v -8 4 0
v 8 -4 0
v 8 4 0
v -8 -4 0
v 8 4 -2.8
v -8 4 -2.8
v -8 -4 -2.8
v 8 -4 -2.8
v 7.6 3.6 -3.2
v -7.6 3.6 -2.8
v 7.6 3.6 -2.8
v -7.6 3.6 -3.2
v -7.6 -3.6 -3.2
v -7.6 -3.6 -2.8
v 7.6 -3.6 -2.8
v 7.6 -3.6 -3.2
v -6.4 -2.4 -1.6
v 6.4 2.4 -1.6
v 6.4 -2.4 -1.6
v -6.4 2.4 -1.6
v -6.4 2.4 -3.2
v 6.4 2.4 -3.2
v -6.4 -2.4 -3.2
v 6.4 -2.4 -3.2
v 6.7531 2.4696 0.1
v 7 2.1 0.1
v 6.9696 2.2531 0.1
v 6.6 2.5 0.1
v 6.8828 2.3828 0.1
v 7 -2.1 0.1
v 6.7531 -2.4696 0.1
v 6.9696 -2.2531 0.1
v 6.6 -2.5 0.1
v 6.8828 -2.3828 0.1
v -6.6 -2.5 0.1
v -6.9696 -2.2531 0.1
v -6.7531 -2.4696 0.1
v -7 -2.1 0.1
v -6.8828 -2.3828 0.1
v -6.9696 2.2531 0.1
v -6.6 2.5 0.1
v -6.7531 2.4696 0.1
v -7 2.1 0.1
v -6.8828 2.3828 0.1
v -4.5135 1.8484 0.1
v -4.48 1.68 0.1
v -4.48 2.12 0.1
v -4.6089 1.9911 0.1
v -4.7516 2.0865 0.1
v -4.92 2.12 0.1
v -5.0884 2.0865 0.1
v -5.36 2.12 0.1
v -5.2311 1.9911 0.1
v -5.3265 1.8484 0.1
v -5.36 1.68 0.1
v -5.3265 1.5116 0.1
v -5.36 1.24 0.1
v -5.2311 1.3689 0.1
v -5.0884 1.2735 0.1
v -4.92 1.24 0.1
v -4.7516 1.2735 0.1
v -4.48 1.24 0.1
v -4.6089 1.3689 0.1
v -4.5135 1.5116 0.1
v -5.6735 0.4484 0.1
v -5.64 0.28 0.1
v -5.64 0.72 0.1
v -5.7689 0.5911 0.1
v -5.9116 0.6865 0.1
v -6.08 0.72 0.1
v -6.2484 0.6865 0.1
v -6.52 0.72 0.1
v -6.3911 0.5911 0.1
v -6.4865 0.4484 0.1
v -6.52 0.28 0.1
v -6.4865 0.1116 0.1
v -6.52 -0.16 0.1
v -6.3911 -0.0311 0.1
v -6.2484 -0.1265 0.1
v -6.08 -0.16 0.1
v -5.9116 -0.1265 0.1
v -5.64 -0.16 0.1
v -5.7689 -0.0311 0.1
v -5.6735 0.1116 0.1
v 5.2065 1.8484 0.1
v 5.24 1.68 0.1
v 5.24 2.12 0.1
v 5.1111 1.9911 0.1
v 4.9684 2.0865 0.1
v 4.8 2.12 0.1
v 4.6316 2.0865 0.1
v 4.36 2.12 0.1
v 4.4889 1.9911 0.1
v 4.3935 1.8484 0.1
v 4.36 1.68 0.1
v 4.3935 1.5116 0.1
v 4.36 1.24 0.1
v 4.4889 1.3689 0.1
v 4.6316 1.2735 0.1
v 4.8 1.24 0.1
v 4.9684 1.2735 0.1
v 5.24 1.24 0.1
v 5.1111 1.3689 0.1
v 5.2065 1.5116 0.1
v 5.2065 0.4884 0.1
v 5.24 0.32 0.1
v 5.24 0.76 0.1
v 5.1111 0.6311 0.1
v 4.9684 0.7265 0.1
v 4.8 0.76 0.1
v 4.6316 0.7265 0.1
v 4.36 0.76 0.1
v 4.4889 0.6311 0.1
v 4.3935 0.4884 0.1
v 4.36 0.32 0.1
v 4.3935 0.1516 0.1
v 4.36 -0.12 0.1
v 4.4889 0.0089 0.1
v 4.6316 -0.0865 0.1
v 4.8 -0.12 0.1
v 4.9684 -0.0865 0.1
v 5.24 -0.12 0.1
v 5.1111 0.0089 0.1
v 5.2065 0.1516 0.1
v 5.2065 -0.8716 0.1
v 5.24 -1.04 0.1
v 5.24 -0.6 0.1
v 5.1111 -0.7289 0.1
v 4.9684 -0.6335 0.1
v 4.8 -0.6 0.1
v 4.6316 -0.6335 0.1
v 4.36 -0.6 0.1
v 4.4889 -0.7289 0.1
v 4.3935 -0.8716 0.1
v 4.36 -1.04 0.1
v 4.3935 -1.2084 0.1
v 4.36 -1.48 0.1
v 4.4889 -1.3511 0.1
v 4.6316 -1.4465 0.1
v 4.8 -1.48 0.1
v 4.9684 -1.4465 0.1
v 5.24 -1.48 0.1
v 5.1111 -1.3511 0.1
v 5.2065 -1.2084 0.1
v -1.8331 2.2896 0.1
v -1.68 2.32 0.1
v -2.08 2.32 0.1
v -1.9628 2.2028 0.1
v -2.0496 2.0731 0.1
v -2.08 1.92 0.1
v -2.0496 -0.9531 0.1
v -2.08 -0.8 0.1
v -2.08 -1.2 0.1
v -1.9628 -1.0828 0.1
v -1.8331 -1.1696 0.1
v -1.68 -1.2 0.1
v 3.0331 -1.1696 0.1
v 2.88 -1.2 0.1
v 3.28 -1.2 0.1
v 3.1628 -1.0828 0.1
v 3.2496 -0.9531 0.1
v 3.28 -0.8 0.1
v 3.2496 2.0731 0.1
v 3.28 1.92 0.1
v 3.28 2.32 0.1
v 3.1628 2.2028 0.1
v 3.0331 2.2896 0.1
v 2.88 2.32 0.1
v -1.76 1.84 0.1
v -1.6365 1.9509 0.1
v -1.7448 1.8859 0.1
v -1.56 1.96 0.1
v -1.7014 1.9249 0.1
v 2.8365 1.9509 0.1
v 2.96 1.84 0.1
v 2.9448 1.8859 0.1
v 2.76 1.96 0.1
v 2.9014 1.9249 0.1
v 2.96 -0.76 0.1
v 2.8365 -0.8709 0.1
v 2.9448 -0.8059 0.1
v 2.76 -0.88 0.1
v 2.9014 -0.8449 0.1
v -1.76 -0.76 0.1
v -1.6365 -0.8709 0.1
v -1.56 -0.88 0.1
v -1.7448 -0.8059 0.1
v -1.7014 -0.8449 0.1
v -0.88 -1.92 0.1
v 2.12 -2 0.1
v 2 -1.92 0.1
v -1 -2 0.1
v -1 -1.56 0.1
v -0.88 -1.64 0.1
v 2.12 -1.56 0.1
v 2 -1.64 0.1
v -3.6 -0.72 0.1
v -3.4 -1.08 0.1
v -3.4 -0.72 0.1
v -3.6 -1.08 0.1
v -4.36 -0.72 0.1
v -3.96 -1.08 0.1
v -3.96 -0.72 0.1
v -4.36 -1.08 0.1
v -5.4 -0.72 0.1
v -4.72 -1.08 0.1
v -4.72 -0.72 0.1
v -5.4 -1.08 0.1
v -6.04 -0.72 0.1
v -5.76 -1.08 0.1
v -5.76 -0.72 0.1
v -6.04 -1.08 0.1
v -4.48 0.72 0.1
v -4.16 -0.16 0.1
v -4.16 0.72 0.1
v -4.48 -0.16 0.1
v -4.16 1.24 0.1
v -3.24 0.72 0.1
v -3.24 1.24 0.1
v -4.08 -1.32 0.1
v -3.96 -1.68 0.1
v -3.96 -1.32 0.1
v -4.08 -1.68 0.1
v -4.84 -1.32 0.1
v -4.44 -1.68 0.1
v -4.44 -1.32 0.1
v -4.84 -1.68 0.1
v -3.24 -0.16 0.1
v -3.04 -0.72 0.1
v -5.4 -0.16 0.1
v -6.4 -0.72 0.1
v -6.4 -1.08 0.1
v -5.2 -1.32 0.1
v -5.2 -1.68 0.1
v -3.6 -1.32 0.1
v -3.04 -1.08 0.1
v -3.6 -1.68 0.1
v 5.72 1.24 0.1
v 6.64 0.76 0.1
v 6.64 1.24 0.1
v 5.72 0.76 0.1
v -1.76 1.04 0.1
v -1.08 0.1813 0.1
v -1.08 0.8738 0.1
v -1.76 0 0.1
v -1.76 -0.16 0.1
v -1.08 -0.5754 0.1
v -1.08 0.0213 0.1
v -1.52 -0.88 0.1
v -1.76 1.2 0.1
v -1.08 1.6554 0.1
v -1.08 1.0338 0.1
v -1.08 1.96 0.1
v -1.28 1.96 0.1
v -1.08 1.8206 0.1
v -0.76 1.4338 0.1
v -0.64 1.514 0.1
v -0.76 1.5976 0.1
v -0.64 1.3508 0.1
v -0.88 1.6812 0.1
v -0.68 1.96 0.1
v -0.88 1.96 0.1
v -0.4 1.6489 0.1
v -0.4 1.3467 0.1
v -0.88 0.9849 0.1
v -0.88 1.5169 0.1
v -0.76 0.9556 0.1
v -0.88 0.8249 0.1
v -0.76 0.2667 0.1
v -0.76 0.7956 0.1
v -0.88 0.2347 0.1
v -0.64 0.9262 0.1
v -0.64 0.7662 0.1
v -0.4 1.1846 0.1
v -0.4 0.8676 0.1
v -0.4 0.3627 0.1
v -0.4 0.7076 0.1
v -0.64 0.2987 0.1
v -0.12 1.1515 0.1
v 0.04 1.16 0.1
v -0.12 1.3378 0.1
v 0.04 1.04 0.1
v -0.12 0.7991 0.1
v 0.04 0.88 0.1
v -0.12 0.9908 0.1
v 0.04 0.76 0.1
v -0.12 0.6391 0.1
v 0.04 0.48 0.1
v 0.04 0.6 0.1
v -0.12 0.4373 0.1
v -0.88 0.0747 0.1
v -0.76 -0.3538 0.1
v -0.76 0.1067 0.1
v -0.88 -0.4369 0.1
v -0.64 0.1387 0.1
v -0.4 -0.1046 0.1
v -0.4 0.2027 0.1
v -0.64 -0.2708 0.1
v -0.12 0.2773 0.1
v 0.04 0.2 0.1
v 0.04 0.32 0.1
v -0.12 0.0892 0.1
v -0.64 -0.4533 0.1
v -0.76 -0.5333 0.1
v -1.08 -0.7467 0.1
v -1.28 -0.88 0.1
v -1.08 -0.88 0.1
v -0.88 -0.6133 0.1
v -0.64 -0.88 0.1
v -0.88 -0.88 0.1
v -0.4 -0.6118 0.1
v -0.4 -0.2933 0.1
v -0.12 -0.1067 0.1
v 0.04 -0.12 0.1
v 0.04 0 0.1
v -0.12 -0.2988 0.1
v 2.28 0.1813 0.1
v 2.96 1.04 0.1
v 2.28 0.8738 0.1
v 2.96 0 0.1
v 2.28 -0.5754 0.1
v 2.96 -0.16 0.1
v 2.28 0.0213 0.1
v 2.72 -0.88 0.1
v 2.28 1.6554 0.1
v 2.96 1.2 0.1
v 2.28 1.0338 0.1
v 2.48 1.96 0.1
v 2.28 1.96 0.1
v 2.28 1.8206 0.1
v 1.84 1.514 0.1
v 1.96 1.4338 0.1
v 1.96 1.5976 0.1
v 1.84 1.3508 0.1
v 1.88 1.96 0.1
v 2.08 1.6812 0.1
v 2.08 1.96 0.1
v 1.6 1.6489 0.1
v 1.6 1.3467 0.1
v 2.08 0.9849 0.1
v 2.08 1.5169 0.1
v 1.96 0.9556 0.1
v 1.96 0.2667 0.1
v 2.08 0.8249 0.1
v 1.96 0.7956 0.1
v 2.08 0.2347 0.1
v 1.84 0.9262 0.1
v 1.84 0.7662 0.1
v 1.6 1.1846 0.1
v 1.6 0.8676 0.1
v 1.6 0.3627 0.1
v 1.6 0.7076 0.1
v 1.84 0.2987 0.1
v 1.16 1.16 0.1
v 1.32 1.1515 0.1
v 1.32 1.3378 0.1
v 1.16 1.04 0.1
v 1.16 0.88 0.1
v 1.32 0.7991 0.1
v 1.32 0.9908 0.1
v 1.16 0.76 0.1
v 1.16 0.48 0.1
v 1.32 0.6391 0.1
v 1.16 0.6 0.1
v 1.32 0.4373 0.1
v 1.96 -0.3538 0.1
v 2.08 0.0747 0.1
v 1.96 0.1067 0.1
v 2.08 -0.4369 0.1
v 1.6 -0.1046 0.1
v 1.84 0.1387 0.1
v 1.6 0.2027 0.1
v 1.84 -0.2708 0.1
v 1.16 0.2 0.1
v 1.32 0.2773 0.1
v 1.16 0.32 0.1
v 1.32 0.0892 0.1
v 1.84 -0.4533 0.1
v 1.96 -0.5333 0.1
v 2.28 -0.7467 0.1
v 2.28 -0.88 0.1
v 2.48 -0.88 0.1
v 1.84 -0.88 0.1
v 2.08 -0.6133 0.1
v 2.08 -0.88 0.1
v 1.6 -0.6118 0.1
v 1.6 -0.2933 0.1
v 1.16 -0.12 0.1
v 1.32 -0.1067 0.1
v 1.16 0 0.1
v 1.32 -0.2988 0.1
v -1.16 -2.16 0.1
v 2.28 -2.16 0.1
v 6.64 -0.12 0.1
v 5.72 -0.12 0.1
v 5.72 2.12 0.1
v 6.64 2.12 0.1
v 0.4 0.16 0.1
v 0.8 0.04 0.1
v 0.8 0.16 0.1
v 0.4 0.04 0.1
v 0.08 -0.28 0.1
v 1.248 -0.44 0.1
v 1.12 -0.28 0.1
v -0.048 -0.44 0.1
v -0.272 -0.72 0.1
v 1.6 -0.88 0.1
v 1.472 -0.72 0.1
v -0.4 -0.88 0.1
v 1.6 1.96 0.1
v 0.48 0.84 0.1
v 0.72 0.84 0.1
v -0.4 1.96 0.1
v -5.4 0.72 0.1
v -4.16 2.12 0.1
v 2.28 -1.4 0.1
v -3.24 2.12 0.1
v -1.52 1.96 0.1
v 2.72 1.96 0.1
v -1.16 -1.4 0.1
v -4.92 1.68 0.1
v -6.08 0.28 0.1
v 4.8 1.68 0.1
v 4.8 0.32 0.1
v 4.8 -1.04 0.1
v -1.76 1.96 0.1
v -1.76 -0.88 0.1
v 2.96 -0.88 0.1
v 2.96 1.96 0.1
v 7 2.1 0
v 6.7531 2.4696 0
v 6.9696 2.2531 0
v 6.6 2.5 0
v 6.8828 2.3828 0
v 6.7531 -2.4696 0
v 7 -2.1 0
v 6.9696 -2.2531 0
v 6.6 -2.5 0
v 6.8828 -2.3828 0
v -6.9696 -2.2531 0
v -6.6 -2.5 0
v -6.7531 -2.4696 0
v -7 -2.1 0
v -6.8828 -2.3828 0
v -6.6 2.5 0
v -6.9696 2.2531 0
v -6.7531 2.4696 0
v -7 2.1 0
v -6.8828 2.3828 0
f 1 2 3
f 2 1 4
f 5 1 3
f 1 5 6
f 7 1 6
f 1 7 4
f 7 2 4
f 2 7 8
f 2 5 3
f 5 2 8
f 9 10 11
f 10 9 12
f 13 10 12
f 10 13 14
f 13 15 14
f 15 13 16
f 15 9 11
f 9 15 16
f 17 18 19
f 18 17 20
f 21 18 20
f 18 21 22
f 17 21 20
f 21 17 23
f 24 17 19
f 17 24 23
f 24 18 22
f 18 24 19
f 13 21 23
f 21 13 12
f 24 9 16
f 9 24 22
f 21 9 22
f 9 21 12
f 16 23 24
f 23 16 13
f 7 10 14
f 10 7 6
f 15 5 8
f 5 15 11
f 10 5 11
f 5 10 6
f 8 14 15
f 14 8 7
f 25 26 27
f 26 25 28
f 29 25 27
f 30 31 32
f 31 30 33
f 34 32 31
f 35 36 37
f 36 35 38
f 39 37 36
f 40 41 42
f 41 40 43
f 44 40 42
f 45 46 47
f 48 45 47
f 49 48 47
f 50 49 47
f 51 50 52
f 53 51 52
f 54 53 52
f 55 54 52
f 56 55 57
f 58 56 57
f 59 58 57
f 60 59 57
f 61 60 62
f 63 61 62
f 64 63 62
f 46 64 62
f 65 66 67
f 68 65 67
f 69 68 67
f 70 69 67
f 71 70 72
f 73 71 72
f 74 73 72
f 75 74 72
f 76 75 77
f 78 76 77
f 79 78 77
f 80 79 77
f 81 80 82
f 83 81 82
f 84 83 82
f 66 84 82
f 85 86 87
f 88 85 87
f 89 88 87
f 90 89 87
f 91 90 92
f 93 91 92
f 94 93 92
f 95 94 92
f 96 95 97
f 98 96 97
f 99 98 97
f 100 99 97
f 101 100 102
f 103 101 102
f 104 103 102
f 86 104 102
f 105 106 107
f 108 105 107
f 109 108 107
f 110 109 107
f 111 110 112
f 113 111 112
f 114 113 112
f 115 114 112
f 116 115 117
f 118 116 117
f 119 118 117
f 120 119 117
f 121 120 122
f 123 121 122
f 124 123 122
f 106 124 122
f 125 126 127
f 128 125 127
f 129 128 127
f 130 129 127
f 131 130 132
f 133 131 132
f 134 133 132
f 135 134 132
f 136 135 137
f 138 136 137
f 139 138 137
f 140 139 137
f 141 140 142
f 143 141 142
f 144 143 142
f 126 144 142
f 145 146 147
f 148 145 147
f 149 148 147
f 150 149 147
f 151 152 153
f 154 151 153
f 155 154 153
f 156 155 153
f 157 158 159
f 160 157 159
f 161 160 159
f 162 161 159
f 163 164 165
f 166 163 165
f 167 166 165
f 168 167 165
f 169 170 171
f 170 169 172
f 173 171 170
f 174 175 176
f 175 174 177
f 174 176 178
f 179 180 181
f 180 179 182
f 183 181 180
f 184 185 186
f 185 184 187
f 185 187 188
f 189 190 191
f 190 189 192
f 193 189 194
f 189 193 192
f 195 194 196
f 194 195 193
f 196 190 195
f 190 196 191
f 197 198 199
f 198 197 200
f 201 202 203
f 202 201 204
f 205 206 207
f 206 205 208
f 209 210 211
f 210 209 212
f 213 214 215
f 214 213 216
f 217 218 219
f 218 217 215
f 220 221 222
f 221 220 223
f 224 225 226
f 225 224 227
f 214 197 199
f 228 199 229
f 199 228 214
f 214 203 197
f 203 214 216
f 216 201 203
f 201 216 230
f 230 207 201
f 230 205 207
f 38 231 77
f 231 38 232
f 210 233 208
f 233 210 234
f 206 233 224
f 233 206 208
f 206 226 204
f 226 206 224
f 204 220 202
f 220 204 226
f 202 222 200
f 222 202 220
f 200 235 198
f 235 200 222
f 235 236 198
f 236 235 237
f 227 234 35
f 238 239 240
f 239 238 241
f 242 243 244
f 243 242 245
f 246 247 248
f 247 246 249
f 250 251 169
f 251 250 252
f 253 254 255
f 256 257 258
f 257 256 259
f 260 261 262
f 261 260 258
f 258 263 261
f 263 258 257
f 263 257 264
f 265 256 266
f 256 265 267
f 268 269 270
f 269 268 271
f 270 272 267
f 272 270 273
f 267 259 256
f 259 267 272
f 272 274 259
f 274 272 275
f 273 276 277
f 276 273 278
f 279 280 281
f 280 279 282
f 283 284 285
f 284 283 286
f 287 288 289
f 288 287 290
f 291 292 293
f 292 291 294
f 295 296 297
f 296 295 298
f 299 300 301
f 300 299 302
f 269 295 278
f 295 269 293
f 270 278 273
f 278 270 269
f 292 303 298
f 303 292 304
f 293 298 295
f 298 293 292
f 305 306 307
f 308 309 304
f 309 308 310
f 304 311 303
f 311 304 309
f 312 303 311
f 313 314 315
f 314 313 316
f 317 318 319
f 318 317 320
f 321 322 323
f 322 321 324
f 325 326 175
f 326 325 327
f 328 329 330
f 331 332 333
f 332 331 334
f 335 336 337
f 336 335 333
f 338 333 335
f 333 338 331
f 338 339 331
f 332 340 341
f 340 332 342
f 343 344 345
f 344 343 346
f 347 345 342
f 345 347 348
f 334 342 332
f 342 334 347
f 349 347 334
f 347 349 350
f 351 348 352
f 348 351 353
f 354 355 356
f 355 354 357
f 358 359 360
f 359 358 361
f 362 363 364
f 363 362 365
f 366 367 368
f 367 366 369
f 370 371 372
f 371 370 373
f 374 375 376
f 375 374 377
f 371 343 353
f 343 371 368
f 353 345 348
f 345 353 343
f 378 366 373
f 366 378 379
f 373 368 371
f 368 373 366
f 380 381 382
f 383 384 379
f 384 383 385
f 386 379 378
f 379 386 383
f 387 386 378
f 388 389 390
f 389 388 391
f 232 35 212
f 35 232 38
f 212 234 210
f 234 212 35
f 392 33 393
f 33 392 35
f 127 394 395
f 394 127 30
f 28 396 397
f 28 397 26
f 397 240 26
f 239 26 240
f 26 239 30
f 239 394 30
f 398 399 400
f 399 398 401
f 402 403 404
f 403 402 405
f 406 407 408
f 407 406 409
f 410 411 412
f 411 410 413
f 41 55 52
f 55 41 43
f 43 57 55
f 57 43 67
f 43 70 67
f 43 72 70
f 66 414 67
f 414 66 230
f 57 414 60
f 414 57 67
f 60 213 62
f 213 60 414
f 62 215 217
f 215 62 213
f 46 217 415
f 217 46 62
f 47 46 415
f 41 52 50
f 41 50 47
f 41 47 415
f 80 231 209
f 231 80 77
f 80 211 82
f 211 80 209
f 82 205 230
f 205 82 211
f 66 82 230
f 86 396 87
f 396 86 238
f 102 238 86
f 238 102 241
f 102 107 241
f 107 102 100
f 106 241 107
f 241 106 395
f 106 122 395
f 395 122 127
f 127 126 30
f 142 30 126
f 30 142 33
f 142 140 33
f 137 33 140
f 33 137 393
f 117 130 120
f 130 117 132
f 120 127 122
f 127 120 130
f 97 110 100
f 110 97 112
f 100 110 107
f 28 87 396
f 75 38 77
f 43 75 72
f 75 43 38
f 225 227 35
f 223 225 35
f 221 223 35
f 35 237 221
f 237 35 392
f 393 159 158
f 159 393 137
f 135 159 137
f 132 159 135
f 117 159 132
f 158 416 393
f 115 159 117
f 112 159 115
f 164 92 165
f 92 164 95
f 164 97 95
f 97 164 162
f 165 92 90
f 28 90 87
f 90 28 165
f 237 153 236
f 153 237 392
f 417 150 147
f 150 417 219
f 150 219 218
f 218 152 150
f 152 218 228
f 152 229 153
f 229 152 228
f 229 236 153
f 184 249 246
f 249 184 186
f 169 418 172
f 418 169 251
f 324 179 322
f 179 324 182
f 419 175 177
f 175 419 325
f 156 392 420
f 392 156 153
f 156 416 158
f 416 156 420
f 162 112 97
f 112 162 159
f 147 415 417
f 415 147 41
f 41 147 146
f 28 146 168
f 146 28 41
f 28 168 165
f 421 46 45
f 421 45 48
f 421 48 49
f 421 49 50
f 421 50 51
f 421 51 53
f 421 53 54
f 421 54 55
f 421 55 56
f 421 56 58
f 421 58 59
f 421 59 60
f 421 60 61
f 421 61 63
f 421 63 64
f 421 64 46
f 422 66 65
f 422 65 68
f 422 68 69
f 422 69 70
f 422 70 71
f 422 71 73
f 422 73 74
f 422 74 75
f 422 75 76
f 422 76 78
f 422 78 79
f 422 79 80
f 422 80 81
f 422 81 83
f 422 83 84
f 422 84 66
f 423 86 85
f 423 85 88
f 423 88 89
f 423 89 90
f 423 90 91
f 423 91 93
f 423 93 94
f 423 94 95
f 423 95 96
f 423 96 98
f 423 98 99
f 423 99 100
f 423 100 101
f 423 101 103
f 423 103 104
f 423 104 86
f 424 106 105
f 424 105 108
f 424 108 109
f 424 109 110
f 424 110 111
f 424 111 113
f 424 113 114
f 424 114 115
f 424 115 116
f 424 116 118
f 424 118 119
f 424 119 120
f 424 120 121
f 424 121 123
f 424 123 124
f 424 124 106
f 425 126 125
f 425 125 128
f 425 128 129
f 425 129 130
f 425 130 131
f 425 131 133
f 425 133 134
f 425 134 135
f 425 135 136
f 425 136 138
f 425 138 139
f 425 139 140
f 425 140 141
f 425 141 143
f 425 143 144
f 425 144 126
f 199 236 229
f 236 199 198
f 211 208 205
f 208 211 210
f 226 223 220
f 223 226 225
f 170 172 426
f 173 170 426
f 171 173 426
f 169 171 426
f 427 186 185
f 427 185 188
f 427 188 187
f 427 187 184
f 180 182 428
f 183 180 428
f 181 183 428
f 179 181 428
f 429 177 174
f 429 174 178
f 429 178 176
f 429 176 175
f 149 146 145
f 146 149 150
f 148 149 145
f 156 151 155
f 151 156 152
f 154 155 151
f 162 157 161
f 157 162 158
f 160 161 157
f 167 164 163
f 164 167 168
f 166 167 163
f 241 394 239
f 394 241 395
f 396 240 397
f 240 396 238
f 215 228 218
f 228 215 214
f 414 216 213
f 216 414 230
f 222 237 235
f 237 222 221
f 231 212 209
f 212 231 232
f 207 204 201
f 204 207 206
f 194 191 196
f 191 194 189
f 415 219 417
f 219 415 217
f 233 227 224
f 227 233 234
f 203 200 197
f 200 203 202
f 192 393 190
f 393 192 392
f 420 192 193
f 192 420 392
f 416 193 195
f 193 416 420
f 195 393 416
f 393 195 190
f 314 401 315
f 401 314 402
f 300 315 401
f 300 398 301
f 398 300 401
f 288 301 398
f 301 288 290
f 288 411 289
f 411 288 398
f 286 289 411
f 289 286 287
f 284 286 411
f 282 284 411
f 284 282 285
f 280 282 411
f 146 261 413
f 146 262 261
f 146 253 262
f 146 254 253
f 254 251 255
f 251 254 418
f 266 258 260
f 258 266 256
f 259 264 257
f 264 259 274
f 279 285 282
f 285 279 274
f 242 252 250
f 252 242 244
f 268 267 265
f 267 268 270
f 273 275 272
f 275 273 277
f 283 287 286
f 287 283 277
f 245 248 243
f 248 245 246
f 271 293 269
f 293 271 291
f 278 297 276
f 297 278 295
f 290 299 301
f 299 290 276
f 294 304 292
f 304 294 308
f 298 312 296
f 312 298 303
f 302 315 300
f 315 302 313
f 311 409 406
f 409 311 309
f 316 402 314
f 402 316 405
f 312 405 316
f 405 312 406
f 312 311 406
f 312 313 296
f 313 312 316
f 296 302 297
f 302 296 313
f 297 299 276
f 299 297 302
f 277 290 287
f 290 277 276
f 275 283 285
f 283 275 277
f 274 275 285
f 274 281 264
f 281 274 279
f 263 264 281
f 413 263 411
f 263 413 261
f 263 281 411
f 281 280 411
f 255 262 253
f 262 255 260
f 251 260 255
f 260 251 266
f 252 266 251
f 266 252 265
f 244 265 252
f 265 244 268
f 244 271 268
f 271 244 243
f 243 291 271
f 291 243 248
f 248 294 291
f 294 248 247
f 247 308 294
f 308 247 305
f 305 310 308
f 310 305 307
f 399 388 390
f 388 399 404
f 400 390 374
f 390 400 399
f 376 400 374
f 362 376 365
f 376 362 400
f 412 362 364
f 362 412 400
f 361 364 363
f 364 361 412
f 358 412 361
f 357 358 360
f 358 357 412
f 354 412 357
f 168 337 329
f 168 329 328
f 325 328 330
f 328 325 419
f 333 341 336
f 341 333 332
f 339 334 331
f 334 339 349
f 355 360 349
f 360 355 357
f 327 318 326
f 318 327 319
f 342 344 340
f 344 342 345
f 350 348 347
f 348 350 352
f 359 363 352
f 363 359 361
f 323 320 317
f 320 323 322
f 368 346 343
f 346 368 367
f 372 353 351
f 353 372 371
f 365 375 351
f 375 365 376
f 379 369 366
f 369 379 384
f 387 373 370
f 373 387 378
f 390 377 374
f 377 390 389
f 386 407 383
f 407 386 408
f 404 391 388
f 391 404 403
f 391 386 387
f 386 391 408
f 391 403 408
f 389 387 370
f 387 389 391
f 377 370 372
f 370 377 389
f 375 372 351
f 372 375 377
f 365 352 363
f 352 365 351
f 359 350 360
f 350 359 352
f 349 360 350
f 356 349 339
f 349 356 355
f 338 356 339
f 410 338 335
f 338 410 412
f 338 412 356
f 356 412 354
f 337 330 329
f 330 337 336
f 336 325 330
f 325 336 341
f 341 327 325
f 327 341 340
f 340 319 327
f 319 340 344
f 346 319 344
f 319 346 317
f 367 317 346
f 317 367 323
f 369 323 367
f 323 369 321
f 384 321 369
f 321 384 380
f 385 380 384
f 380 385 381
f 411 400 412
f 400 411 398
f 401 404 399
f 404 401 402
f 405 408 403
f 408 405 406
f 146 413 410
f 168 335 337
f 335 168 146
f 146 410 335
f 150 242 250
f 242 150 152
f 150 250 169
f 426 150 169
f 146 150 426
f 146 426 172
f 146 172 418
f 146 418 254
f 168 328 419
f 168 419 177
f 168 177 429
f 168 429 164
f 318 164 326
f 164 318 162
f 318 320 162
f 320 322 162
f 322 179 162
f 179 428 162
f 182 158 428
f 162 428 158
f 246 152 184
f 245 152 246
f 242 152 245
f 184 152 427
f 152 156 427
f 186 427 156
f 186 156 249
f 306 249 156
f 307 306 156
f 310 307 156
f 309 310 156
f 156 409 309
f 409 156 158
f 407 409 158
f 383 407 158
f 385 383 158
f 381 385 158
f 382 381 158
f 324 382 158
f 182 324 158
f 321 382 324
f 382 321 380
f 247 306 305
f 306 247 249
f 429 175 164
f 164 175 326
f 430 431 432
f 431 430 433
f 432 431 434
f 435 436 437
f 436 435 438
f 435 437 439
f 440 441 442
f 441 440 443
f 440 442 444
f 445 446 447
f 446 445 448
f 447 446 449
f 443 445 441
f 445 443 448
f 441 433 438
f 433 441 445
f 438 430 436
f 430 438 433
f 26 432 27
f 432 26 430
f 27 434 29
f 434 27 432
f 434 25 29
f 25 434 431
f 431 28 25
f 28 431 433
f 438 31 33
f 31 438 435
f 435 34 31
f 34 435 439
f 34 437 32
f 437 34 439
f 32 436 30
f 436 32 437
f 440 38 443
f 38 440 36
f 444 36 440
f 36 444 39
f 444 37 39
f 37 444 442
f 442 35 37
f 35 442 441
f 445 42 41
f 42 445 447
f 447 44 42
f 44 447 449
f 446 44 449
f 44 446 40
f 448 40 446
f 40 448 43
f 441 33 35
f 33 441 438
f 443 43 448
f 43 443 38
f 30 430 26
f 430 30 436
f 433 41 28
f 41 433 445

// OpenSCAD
use <../lib.scad>
use <3069b.scad>
use <6041468e.scad>
function ldraw_lib__3069bd0b() = [
// 0 Tile  1 x  2 with Buttons and Screen with SW Death Star Trench Sticker
// 0 Name: 3069bd0b.dat
// 0 Author: Evert-Jan Boer [ejboer]
// 0 !LDRAW_ORG Shortcut UPDATE 2024-08
// 0 !LICENSE Licensed under CC BY 4.0 : see CAreadme.txt
// 
// 0 BFC CERTIFY CCW
  [0,"BFC","CERTIFY"],
  [0,"BFC","CCW"],
// 
// 0 !CATEGORY Sticker Shortcut
// 0 !KEYWORDS Bricklink 3069pb0386, Set 10240, X-Wing
// 
// 0 !HISTORY 2024-09-30 [OrionP] Official Update 2024-08
// 
// 1 16 0 0 0 1 0 0 0 1 0 0 0 1 3069b.dat
  [1,16,0,0,0,1,0,0,0,1,0,0,0,1, ldraw_lib__3069b()],
// 1 16 0 0 0 1 0 0 0 1 0 0 0 1 6041468e.dat
  [1,16,0,0,0,1,0,0,0,1,0,0,0,1, ldraw_lib__6041468e()],
];
module ldraw_lib__3069bd0b(step=0, col=false, unit=2/5, alt=false, line=0.2, solid=!$preview)
    makepoly(ldraw_lib__3069bd0b(), step=step, col=col, unit=unit, alt=alt, line=line, solid=solid);
ldraw_lib__3069bd0b(line=0.2);
